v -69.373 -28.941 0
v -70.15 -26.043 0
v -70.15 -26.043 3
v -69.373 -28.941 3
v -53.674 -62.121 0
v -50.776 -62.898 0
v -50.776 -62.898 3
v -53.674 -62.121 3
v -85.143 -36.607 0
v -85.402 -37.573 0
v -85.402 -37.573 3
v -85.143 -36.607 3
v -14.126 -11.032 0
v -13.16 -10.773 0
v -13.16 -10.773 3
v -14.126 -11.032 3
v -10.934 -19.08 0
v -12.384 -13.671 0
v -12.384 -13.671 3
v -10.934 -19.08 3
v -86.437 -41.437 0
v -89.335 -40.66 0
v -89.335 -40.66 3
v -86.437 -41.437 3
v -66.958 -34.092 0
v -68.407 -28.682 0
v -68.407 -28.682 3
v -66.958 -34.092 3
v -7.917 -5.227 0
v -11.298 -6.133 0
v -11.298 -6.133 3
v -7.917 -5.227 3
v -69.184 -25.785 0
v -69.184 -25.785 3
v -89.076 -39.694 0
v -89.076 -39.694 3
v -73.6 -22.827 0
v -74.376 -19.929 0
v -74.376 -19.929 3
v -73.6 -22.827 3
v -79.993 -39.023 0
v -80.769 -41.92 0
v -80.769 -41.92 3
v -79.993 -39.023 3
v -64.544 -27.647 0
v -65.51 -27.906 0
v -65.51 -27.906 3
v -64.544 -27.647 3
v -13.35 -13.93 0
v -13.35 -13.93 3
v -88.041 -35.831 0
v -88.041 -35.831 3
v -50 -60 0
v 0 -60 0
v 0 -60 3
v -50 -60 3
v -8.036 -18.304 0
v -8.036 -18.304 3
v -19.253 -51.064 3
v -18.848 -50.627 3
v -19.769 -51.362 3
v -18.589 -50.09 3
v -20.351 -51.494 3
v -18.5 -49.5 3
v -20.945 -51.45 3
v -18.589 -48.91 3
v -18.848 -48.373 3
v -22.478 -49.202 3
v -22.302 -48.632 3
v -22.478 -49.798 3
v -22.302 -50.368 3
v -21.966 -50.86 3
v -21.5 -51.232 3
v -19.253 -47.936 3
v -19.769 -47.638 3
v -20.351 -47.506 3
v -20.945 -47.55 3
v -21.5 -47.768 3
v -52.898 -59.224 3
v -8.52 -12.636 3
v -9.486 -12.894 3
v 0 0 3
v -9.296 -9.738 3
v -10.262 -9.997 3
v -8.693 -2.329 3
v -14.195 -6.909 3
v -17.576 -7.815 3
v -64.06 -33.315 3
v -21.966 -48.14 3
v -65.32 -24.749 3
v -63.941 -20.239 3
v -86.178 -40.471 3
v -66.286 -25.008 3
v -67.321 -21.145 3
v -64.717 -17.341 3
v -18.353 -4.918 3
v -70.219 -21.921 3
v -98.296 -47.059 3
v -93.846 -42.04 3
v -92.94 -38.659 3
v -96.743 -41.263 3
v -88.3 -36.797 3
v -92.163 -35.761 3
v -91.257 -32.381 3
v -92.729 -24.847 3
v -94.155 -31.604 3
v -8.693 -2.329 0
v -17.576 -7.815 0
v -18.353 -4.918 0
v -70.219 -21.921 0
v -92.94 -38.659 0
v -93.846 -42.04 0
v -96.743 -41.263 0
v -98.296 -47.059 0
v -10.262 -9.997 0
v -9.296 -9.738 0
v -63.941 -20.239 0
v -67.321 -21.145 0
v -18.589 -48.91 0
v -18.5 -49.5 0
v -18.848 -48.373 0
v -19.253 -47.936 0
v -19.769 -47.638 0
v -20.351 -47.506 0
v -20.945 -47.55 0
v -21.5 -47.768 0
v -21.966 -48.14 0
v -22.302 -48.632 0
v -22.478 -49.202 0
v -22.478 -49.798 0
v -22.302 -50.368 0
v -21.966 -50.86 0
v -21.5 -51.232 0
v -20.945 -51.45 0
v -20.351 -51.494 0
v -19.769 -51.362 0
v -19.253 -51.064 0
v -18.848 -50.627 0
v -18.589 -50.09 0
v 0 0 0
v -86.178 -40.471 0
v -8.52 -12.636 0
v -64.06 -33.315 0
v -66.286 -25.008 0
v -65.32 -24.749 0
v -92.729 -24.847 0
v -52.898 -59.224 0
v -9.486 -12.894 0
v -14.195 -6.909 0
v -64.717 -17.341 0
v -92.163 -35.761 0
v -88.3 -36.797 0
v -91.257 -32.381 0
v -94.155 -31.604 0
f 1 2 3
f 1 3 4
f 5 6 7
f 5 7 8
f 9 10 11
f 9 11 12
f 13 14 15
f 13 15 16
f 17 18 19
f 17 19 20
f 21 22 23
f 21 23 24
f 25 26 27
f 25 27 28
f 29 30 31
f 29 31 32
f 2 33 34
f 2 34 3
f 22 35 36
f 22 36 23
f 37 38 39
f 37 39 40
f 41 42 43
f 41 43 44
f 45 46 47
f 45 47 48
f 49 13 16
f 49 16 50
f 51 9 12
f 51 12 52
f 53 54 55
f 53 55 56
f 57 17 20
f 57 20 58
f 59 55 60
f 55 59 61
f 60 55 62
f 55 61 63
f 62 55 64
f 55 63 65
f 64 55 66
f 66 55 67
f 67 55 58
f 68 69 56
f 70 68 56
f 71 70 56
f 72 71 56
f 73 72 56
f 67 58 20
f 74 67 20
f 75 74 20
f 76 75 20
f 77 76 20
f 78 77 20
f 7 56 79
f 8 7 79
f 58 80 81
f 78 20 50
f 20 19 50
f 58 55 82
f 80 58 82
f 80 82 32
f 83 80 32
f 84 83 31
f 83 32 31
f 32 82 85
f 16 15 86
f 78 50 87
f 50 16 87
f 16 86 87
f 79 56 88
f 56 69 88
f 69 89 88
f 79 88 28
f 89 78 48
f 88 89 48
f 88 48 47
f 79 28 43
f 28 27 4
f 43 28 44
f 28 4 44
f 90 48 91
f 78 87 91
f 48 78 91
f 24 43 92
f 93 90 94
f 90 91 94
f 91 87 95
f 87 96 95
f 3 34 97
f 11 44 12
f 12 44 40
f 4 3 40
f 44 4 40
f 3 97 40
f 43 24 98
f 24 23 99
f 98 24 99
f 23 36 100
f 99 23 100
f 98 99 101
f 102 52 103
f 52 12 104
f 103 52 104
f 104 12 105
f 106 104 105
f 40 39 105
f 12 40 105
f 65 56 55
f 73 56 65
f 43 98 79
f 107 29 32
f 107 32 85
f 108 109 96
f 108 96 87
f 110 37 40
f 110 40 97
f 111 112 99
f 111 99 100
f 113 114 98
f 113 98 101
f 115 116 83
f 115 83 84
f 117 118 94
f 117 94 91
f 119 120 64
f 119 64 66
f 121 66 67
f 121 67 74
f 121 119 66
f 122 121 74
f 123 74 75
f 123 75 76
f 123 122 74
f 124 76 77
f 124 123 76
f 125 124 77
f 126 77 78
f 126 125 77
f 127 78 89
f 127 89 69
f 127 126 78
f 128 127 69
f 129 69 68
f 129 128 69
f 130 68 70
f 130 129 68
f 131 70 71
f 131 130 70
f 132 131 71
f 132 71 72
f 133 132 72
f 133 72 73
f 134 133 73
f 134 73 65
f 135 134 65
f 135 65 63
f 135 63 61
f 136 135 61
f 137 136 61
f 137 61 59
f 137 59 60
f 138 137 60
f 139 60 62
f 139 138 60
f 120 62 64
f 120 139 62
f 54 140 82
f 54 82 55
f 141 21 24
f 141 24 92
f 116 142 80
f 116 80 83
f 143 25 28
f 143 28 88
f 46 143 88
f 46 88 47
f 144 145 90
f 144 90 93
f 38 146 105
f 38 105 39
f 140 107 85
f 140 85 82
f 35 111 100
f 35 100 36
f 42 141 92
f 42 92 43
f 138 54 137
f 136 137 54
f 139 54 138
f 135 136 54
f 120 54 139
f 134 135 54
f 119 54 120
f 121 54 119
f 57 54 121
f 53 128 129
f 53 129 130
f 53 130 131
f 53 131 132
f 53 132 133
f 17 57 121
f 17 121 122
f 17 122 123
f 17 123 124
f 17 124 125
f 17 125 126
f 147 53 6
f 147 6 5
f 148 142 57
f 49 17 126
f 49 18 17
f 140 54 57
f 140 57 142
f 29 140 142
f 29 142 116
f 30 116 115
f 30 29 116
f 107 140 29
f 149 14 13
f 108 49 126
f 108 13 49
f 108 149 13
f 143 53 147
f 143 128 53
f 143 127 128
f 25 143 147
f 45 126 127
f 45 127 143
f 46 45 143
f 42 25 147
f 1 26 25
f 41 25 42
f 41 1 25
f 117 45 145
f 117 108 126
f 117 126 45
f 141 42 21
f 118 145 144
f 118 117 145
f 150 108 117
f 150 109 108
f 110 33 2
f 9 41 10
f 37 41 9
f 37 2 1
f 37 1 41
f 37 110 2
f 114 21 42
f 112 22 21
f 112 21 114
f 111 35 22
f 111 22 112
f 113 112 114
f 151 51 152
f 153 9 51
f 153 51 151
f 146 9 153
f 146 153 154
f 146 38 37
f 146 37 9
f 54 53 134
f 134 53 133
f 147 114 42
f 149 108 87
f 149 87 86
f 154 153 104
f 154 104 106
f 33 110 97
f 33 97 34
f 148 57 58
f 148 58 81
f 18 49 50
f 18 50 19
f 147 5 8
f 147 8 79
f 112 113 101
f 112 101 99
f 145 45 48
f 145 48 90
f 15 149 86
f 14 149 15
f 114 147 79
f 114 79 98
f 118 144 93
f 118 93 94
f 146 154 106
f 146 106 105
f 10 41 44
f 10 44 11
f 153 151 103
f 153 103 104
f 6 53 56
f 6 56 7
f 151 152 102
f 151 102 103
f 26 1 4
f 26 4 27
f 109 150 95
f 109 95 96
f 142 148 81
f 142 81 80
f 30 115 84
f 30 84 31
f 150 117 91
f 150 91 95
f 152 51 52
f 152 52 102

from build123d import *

# Parameters (mm, degrees)
SKETCH_1_R      = 2
EXTRUDE_1_DEPTH = 3


with BuildPart() as part:
    # 草图1 → 凸台-拉伸1 (new body)
    with BuildSketch(Plane.XY):
        Polygon((0, 0), (0, -60), (-50, -60), (-50.776457135, -62.897777479), (-53.674234614, -62.121320344), (-52.897777479, -59.223542865), (-98.296291314, -47.059047745), (-96.743377044, -41.263492787), (-93.845599565, -42.039949922), (-92.939732907, -38.65920953), (-89.076029602, -39.694485711), (-89.334848647, -40.660411537), (-86.437071168, -41.436868672), (-86.178252123, -40.470942846), (-80.769067496, -41.920329499), (-79.992610361, -39.02255202), (-85.401794988, -37.573165367), (-85.142975943, -36.607239541), (-88.040753422, -35.830782406), (-88.299572467, -36.796708232), (-92.163275772, -35.761432052), (-91.257409114, -32.38069166), (-94.155186593, -31.604234524), (-92.728879324, -24.84662833), (-74.376288624, -19.929066473), (-73.599831489, -22.826843952), (-70.219091097, -21.920977294), (-69.183814917, -25.784680599), (-70.149740743, -26.043499644), (-69.373283608, -28.941277123), (-68.407357781, -28.682458078), (-66.957971129, -34.091642705), (-64.06019365, -33.31518557), (-65.509580302, -27.906000943), (-64.543654476, -27.647181898), (-65.320111611, -24.749404419), (-66.286037438, -25.008223464), (-67.321313618, -21.144520159), (-63.940573226, -20.238653501), (-64.717030361, -17.340876022), (-18.352590699, -4.917561857), (-17.576133564, -7.815339336), (-14.195393172, -6.909472678), (-13.160116992, -10.773175983), (-14.126042818, -11.031995028), (-13.349585683, -13.929772507), (-12.383659856, -13.670953462), (-10.934273204, -19.080138089), (-8.036495725, -18.303680954), (-9.485882378, -12.894496327), (-8.519956551, -12.635677282), (-9.296413687, -9.737899803), (-10.262339513, -9.996718848), (-11.297615693, -6.133015543), (-7.916875301, -5.227148885), (-8.693332437, -2.329371406), align=None)
        with Locations((-20.5, -49.5)):
            Circle(SKETCH_1_R, mode=Mode.SUBTRACT)
    extrude(amount=EXTRUDE_1_DEPTH)


solid = part.part
